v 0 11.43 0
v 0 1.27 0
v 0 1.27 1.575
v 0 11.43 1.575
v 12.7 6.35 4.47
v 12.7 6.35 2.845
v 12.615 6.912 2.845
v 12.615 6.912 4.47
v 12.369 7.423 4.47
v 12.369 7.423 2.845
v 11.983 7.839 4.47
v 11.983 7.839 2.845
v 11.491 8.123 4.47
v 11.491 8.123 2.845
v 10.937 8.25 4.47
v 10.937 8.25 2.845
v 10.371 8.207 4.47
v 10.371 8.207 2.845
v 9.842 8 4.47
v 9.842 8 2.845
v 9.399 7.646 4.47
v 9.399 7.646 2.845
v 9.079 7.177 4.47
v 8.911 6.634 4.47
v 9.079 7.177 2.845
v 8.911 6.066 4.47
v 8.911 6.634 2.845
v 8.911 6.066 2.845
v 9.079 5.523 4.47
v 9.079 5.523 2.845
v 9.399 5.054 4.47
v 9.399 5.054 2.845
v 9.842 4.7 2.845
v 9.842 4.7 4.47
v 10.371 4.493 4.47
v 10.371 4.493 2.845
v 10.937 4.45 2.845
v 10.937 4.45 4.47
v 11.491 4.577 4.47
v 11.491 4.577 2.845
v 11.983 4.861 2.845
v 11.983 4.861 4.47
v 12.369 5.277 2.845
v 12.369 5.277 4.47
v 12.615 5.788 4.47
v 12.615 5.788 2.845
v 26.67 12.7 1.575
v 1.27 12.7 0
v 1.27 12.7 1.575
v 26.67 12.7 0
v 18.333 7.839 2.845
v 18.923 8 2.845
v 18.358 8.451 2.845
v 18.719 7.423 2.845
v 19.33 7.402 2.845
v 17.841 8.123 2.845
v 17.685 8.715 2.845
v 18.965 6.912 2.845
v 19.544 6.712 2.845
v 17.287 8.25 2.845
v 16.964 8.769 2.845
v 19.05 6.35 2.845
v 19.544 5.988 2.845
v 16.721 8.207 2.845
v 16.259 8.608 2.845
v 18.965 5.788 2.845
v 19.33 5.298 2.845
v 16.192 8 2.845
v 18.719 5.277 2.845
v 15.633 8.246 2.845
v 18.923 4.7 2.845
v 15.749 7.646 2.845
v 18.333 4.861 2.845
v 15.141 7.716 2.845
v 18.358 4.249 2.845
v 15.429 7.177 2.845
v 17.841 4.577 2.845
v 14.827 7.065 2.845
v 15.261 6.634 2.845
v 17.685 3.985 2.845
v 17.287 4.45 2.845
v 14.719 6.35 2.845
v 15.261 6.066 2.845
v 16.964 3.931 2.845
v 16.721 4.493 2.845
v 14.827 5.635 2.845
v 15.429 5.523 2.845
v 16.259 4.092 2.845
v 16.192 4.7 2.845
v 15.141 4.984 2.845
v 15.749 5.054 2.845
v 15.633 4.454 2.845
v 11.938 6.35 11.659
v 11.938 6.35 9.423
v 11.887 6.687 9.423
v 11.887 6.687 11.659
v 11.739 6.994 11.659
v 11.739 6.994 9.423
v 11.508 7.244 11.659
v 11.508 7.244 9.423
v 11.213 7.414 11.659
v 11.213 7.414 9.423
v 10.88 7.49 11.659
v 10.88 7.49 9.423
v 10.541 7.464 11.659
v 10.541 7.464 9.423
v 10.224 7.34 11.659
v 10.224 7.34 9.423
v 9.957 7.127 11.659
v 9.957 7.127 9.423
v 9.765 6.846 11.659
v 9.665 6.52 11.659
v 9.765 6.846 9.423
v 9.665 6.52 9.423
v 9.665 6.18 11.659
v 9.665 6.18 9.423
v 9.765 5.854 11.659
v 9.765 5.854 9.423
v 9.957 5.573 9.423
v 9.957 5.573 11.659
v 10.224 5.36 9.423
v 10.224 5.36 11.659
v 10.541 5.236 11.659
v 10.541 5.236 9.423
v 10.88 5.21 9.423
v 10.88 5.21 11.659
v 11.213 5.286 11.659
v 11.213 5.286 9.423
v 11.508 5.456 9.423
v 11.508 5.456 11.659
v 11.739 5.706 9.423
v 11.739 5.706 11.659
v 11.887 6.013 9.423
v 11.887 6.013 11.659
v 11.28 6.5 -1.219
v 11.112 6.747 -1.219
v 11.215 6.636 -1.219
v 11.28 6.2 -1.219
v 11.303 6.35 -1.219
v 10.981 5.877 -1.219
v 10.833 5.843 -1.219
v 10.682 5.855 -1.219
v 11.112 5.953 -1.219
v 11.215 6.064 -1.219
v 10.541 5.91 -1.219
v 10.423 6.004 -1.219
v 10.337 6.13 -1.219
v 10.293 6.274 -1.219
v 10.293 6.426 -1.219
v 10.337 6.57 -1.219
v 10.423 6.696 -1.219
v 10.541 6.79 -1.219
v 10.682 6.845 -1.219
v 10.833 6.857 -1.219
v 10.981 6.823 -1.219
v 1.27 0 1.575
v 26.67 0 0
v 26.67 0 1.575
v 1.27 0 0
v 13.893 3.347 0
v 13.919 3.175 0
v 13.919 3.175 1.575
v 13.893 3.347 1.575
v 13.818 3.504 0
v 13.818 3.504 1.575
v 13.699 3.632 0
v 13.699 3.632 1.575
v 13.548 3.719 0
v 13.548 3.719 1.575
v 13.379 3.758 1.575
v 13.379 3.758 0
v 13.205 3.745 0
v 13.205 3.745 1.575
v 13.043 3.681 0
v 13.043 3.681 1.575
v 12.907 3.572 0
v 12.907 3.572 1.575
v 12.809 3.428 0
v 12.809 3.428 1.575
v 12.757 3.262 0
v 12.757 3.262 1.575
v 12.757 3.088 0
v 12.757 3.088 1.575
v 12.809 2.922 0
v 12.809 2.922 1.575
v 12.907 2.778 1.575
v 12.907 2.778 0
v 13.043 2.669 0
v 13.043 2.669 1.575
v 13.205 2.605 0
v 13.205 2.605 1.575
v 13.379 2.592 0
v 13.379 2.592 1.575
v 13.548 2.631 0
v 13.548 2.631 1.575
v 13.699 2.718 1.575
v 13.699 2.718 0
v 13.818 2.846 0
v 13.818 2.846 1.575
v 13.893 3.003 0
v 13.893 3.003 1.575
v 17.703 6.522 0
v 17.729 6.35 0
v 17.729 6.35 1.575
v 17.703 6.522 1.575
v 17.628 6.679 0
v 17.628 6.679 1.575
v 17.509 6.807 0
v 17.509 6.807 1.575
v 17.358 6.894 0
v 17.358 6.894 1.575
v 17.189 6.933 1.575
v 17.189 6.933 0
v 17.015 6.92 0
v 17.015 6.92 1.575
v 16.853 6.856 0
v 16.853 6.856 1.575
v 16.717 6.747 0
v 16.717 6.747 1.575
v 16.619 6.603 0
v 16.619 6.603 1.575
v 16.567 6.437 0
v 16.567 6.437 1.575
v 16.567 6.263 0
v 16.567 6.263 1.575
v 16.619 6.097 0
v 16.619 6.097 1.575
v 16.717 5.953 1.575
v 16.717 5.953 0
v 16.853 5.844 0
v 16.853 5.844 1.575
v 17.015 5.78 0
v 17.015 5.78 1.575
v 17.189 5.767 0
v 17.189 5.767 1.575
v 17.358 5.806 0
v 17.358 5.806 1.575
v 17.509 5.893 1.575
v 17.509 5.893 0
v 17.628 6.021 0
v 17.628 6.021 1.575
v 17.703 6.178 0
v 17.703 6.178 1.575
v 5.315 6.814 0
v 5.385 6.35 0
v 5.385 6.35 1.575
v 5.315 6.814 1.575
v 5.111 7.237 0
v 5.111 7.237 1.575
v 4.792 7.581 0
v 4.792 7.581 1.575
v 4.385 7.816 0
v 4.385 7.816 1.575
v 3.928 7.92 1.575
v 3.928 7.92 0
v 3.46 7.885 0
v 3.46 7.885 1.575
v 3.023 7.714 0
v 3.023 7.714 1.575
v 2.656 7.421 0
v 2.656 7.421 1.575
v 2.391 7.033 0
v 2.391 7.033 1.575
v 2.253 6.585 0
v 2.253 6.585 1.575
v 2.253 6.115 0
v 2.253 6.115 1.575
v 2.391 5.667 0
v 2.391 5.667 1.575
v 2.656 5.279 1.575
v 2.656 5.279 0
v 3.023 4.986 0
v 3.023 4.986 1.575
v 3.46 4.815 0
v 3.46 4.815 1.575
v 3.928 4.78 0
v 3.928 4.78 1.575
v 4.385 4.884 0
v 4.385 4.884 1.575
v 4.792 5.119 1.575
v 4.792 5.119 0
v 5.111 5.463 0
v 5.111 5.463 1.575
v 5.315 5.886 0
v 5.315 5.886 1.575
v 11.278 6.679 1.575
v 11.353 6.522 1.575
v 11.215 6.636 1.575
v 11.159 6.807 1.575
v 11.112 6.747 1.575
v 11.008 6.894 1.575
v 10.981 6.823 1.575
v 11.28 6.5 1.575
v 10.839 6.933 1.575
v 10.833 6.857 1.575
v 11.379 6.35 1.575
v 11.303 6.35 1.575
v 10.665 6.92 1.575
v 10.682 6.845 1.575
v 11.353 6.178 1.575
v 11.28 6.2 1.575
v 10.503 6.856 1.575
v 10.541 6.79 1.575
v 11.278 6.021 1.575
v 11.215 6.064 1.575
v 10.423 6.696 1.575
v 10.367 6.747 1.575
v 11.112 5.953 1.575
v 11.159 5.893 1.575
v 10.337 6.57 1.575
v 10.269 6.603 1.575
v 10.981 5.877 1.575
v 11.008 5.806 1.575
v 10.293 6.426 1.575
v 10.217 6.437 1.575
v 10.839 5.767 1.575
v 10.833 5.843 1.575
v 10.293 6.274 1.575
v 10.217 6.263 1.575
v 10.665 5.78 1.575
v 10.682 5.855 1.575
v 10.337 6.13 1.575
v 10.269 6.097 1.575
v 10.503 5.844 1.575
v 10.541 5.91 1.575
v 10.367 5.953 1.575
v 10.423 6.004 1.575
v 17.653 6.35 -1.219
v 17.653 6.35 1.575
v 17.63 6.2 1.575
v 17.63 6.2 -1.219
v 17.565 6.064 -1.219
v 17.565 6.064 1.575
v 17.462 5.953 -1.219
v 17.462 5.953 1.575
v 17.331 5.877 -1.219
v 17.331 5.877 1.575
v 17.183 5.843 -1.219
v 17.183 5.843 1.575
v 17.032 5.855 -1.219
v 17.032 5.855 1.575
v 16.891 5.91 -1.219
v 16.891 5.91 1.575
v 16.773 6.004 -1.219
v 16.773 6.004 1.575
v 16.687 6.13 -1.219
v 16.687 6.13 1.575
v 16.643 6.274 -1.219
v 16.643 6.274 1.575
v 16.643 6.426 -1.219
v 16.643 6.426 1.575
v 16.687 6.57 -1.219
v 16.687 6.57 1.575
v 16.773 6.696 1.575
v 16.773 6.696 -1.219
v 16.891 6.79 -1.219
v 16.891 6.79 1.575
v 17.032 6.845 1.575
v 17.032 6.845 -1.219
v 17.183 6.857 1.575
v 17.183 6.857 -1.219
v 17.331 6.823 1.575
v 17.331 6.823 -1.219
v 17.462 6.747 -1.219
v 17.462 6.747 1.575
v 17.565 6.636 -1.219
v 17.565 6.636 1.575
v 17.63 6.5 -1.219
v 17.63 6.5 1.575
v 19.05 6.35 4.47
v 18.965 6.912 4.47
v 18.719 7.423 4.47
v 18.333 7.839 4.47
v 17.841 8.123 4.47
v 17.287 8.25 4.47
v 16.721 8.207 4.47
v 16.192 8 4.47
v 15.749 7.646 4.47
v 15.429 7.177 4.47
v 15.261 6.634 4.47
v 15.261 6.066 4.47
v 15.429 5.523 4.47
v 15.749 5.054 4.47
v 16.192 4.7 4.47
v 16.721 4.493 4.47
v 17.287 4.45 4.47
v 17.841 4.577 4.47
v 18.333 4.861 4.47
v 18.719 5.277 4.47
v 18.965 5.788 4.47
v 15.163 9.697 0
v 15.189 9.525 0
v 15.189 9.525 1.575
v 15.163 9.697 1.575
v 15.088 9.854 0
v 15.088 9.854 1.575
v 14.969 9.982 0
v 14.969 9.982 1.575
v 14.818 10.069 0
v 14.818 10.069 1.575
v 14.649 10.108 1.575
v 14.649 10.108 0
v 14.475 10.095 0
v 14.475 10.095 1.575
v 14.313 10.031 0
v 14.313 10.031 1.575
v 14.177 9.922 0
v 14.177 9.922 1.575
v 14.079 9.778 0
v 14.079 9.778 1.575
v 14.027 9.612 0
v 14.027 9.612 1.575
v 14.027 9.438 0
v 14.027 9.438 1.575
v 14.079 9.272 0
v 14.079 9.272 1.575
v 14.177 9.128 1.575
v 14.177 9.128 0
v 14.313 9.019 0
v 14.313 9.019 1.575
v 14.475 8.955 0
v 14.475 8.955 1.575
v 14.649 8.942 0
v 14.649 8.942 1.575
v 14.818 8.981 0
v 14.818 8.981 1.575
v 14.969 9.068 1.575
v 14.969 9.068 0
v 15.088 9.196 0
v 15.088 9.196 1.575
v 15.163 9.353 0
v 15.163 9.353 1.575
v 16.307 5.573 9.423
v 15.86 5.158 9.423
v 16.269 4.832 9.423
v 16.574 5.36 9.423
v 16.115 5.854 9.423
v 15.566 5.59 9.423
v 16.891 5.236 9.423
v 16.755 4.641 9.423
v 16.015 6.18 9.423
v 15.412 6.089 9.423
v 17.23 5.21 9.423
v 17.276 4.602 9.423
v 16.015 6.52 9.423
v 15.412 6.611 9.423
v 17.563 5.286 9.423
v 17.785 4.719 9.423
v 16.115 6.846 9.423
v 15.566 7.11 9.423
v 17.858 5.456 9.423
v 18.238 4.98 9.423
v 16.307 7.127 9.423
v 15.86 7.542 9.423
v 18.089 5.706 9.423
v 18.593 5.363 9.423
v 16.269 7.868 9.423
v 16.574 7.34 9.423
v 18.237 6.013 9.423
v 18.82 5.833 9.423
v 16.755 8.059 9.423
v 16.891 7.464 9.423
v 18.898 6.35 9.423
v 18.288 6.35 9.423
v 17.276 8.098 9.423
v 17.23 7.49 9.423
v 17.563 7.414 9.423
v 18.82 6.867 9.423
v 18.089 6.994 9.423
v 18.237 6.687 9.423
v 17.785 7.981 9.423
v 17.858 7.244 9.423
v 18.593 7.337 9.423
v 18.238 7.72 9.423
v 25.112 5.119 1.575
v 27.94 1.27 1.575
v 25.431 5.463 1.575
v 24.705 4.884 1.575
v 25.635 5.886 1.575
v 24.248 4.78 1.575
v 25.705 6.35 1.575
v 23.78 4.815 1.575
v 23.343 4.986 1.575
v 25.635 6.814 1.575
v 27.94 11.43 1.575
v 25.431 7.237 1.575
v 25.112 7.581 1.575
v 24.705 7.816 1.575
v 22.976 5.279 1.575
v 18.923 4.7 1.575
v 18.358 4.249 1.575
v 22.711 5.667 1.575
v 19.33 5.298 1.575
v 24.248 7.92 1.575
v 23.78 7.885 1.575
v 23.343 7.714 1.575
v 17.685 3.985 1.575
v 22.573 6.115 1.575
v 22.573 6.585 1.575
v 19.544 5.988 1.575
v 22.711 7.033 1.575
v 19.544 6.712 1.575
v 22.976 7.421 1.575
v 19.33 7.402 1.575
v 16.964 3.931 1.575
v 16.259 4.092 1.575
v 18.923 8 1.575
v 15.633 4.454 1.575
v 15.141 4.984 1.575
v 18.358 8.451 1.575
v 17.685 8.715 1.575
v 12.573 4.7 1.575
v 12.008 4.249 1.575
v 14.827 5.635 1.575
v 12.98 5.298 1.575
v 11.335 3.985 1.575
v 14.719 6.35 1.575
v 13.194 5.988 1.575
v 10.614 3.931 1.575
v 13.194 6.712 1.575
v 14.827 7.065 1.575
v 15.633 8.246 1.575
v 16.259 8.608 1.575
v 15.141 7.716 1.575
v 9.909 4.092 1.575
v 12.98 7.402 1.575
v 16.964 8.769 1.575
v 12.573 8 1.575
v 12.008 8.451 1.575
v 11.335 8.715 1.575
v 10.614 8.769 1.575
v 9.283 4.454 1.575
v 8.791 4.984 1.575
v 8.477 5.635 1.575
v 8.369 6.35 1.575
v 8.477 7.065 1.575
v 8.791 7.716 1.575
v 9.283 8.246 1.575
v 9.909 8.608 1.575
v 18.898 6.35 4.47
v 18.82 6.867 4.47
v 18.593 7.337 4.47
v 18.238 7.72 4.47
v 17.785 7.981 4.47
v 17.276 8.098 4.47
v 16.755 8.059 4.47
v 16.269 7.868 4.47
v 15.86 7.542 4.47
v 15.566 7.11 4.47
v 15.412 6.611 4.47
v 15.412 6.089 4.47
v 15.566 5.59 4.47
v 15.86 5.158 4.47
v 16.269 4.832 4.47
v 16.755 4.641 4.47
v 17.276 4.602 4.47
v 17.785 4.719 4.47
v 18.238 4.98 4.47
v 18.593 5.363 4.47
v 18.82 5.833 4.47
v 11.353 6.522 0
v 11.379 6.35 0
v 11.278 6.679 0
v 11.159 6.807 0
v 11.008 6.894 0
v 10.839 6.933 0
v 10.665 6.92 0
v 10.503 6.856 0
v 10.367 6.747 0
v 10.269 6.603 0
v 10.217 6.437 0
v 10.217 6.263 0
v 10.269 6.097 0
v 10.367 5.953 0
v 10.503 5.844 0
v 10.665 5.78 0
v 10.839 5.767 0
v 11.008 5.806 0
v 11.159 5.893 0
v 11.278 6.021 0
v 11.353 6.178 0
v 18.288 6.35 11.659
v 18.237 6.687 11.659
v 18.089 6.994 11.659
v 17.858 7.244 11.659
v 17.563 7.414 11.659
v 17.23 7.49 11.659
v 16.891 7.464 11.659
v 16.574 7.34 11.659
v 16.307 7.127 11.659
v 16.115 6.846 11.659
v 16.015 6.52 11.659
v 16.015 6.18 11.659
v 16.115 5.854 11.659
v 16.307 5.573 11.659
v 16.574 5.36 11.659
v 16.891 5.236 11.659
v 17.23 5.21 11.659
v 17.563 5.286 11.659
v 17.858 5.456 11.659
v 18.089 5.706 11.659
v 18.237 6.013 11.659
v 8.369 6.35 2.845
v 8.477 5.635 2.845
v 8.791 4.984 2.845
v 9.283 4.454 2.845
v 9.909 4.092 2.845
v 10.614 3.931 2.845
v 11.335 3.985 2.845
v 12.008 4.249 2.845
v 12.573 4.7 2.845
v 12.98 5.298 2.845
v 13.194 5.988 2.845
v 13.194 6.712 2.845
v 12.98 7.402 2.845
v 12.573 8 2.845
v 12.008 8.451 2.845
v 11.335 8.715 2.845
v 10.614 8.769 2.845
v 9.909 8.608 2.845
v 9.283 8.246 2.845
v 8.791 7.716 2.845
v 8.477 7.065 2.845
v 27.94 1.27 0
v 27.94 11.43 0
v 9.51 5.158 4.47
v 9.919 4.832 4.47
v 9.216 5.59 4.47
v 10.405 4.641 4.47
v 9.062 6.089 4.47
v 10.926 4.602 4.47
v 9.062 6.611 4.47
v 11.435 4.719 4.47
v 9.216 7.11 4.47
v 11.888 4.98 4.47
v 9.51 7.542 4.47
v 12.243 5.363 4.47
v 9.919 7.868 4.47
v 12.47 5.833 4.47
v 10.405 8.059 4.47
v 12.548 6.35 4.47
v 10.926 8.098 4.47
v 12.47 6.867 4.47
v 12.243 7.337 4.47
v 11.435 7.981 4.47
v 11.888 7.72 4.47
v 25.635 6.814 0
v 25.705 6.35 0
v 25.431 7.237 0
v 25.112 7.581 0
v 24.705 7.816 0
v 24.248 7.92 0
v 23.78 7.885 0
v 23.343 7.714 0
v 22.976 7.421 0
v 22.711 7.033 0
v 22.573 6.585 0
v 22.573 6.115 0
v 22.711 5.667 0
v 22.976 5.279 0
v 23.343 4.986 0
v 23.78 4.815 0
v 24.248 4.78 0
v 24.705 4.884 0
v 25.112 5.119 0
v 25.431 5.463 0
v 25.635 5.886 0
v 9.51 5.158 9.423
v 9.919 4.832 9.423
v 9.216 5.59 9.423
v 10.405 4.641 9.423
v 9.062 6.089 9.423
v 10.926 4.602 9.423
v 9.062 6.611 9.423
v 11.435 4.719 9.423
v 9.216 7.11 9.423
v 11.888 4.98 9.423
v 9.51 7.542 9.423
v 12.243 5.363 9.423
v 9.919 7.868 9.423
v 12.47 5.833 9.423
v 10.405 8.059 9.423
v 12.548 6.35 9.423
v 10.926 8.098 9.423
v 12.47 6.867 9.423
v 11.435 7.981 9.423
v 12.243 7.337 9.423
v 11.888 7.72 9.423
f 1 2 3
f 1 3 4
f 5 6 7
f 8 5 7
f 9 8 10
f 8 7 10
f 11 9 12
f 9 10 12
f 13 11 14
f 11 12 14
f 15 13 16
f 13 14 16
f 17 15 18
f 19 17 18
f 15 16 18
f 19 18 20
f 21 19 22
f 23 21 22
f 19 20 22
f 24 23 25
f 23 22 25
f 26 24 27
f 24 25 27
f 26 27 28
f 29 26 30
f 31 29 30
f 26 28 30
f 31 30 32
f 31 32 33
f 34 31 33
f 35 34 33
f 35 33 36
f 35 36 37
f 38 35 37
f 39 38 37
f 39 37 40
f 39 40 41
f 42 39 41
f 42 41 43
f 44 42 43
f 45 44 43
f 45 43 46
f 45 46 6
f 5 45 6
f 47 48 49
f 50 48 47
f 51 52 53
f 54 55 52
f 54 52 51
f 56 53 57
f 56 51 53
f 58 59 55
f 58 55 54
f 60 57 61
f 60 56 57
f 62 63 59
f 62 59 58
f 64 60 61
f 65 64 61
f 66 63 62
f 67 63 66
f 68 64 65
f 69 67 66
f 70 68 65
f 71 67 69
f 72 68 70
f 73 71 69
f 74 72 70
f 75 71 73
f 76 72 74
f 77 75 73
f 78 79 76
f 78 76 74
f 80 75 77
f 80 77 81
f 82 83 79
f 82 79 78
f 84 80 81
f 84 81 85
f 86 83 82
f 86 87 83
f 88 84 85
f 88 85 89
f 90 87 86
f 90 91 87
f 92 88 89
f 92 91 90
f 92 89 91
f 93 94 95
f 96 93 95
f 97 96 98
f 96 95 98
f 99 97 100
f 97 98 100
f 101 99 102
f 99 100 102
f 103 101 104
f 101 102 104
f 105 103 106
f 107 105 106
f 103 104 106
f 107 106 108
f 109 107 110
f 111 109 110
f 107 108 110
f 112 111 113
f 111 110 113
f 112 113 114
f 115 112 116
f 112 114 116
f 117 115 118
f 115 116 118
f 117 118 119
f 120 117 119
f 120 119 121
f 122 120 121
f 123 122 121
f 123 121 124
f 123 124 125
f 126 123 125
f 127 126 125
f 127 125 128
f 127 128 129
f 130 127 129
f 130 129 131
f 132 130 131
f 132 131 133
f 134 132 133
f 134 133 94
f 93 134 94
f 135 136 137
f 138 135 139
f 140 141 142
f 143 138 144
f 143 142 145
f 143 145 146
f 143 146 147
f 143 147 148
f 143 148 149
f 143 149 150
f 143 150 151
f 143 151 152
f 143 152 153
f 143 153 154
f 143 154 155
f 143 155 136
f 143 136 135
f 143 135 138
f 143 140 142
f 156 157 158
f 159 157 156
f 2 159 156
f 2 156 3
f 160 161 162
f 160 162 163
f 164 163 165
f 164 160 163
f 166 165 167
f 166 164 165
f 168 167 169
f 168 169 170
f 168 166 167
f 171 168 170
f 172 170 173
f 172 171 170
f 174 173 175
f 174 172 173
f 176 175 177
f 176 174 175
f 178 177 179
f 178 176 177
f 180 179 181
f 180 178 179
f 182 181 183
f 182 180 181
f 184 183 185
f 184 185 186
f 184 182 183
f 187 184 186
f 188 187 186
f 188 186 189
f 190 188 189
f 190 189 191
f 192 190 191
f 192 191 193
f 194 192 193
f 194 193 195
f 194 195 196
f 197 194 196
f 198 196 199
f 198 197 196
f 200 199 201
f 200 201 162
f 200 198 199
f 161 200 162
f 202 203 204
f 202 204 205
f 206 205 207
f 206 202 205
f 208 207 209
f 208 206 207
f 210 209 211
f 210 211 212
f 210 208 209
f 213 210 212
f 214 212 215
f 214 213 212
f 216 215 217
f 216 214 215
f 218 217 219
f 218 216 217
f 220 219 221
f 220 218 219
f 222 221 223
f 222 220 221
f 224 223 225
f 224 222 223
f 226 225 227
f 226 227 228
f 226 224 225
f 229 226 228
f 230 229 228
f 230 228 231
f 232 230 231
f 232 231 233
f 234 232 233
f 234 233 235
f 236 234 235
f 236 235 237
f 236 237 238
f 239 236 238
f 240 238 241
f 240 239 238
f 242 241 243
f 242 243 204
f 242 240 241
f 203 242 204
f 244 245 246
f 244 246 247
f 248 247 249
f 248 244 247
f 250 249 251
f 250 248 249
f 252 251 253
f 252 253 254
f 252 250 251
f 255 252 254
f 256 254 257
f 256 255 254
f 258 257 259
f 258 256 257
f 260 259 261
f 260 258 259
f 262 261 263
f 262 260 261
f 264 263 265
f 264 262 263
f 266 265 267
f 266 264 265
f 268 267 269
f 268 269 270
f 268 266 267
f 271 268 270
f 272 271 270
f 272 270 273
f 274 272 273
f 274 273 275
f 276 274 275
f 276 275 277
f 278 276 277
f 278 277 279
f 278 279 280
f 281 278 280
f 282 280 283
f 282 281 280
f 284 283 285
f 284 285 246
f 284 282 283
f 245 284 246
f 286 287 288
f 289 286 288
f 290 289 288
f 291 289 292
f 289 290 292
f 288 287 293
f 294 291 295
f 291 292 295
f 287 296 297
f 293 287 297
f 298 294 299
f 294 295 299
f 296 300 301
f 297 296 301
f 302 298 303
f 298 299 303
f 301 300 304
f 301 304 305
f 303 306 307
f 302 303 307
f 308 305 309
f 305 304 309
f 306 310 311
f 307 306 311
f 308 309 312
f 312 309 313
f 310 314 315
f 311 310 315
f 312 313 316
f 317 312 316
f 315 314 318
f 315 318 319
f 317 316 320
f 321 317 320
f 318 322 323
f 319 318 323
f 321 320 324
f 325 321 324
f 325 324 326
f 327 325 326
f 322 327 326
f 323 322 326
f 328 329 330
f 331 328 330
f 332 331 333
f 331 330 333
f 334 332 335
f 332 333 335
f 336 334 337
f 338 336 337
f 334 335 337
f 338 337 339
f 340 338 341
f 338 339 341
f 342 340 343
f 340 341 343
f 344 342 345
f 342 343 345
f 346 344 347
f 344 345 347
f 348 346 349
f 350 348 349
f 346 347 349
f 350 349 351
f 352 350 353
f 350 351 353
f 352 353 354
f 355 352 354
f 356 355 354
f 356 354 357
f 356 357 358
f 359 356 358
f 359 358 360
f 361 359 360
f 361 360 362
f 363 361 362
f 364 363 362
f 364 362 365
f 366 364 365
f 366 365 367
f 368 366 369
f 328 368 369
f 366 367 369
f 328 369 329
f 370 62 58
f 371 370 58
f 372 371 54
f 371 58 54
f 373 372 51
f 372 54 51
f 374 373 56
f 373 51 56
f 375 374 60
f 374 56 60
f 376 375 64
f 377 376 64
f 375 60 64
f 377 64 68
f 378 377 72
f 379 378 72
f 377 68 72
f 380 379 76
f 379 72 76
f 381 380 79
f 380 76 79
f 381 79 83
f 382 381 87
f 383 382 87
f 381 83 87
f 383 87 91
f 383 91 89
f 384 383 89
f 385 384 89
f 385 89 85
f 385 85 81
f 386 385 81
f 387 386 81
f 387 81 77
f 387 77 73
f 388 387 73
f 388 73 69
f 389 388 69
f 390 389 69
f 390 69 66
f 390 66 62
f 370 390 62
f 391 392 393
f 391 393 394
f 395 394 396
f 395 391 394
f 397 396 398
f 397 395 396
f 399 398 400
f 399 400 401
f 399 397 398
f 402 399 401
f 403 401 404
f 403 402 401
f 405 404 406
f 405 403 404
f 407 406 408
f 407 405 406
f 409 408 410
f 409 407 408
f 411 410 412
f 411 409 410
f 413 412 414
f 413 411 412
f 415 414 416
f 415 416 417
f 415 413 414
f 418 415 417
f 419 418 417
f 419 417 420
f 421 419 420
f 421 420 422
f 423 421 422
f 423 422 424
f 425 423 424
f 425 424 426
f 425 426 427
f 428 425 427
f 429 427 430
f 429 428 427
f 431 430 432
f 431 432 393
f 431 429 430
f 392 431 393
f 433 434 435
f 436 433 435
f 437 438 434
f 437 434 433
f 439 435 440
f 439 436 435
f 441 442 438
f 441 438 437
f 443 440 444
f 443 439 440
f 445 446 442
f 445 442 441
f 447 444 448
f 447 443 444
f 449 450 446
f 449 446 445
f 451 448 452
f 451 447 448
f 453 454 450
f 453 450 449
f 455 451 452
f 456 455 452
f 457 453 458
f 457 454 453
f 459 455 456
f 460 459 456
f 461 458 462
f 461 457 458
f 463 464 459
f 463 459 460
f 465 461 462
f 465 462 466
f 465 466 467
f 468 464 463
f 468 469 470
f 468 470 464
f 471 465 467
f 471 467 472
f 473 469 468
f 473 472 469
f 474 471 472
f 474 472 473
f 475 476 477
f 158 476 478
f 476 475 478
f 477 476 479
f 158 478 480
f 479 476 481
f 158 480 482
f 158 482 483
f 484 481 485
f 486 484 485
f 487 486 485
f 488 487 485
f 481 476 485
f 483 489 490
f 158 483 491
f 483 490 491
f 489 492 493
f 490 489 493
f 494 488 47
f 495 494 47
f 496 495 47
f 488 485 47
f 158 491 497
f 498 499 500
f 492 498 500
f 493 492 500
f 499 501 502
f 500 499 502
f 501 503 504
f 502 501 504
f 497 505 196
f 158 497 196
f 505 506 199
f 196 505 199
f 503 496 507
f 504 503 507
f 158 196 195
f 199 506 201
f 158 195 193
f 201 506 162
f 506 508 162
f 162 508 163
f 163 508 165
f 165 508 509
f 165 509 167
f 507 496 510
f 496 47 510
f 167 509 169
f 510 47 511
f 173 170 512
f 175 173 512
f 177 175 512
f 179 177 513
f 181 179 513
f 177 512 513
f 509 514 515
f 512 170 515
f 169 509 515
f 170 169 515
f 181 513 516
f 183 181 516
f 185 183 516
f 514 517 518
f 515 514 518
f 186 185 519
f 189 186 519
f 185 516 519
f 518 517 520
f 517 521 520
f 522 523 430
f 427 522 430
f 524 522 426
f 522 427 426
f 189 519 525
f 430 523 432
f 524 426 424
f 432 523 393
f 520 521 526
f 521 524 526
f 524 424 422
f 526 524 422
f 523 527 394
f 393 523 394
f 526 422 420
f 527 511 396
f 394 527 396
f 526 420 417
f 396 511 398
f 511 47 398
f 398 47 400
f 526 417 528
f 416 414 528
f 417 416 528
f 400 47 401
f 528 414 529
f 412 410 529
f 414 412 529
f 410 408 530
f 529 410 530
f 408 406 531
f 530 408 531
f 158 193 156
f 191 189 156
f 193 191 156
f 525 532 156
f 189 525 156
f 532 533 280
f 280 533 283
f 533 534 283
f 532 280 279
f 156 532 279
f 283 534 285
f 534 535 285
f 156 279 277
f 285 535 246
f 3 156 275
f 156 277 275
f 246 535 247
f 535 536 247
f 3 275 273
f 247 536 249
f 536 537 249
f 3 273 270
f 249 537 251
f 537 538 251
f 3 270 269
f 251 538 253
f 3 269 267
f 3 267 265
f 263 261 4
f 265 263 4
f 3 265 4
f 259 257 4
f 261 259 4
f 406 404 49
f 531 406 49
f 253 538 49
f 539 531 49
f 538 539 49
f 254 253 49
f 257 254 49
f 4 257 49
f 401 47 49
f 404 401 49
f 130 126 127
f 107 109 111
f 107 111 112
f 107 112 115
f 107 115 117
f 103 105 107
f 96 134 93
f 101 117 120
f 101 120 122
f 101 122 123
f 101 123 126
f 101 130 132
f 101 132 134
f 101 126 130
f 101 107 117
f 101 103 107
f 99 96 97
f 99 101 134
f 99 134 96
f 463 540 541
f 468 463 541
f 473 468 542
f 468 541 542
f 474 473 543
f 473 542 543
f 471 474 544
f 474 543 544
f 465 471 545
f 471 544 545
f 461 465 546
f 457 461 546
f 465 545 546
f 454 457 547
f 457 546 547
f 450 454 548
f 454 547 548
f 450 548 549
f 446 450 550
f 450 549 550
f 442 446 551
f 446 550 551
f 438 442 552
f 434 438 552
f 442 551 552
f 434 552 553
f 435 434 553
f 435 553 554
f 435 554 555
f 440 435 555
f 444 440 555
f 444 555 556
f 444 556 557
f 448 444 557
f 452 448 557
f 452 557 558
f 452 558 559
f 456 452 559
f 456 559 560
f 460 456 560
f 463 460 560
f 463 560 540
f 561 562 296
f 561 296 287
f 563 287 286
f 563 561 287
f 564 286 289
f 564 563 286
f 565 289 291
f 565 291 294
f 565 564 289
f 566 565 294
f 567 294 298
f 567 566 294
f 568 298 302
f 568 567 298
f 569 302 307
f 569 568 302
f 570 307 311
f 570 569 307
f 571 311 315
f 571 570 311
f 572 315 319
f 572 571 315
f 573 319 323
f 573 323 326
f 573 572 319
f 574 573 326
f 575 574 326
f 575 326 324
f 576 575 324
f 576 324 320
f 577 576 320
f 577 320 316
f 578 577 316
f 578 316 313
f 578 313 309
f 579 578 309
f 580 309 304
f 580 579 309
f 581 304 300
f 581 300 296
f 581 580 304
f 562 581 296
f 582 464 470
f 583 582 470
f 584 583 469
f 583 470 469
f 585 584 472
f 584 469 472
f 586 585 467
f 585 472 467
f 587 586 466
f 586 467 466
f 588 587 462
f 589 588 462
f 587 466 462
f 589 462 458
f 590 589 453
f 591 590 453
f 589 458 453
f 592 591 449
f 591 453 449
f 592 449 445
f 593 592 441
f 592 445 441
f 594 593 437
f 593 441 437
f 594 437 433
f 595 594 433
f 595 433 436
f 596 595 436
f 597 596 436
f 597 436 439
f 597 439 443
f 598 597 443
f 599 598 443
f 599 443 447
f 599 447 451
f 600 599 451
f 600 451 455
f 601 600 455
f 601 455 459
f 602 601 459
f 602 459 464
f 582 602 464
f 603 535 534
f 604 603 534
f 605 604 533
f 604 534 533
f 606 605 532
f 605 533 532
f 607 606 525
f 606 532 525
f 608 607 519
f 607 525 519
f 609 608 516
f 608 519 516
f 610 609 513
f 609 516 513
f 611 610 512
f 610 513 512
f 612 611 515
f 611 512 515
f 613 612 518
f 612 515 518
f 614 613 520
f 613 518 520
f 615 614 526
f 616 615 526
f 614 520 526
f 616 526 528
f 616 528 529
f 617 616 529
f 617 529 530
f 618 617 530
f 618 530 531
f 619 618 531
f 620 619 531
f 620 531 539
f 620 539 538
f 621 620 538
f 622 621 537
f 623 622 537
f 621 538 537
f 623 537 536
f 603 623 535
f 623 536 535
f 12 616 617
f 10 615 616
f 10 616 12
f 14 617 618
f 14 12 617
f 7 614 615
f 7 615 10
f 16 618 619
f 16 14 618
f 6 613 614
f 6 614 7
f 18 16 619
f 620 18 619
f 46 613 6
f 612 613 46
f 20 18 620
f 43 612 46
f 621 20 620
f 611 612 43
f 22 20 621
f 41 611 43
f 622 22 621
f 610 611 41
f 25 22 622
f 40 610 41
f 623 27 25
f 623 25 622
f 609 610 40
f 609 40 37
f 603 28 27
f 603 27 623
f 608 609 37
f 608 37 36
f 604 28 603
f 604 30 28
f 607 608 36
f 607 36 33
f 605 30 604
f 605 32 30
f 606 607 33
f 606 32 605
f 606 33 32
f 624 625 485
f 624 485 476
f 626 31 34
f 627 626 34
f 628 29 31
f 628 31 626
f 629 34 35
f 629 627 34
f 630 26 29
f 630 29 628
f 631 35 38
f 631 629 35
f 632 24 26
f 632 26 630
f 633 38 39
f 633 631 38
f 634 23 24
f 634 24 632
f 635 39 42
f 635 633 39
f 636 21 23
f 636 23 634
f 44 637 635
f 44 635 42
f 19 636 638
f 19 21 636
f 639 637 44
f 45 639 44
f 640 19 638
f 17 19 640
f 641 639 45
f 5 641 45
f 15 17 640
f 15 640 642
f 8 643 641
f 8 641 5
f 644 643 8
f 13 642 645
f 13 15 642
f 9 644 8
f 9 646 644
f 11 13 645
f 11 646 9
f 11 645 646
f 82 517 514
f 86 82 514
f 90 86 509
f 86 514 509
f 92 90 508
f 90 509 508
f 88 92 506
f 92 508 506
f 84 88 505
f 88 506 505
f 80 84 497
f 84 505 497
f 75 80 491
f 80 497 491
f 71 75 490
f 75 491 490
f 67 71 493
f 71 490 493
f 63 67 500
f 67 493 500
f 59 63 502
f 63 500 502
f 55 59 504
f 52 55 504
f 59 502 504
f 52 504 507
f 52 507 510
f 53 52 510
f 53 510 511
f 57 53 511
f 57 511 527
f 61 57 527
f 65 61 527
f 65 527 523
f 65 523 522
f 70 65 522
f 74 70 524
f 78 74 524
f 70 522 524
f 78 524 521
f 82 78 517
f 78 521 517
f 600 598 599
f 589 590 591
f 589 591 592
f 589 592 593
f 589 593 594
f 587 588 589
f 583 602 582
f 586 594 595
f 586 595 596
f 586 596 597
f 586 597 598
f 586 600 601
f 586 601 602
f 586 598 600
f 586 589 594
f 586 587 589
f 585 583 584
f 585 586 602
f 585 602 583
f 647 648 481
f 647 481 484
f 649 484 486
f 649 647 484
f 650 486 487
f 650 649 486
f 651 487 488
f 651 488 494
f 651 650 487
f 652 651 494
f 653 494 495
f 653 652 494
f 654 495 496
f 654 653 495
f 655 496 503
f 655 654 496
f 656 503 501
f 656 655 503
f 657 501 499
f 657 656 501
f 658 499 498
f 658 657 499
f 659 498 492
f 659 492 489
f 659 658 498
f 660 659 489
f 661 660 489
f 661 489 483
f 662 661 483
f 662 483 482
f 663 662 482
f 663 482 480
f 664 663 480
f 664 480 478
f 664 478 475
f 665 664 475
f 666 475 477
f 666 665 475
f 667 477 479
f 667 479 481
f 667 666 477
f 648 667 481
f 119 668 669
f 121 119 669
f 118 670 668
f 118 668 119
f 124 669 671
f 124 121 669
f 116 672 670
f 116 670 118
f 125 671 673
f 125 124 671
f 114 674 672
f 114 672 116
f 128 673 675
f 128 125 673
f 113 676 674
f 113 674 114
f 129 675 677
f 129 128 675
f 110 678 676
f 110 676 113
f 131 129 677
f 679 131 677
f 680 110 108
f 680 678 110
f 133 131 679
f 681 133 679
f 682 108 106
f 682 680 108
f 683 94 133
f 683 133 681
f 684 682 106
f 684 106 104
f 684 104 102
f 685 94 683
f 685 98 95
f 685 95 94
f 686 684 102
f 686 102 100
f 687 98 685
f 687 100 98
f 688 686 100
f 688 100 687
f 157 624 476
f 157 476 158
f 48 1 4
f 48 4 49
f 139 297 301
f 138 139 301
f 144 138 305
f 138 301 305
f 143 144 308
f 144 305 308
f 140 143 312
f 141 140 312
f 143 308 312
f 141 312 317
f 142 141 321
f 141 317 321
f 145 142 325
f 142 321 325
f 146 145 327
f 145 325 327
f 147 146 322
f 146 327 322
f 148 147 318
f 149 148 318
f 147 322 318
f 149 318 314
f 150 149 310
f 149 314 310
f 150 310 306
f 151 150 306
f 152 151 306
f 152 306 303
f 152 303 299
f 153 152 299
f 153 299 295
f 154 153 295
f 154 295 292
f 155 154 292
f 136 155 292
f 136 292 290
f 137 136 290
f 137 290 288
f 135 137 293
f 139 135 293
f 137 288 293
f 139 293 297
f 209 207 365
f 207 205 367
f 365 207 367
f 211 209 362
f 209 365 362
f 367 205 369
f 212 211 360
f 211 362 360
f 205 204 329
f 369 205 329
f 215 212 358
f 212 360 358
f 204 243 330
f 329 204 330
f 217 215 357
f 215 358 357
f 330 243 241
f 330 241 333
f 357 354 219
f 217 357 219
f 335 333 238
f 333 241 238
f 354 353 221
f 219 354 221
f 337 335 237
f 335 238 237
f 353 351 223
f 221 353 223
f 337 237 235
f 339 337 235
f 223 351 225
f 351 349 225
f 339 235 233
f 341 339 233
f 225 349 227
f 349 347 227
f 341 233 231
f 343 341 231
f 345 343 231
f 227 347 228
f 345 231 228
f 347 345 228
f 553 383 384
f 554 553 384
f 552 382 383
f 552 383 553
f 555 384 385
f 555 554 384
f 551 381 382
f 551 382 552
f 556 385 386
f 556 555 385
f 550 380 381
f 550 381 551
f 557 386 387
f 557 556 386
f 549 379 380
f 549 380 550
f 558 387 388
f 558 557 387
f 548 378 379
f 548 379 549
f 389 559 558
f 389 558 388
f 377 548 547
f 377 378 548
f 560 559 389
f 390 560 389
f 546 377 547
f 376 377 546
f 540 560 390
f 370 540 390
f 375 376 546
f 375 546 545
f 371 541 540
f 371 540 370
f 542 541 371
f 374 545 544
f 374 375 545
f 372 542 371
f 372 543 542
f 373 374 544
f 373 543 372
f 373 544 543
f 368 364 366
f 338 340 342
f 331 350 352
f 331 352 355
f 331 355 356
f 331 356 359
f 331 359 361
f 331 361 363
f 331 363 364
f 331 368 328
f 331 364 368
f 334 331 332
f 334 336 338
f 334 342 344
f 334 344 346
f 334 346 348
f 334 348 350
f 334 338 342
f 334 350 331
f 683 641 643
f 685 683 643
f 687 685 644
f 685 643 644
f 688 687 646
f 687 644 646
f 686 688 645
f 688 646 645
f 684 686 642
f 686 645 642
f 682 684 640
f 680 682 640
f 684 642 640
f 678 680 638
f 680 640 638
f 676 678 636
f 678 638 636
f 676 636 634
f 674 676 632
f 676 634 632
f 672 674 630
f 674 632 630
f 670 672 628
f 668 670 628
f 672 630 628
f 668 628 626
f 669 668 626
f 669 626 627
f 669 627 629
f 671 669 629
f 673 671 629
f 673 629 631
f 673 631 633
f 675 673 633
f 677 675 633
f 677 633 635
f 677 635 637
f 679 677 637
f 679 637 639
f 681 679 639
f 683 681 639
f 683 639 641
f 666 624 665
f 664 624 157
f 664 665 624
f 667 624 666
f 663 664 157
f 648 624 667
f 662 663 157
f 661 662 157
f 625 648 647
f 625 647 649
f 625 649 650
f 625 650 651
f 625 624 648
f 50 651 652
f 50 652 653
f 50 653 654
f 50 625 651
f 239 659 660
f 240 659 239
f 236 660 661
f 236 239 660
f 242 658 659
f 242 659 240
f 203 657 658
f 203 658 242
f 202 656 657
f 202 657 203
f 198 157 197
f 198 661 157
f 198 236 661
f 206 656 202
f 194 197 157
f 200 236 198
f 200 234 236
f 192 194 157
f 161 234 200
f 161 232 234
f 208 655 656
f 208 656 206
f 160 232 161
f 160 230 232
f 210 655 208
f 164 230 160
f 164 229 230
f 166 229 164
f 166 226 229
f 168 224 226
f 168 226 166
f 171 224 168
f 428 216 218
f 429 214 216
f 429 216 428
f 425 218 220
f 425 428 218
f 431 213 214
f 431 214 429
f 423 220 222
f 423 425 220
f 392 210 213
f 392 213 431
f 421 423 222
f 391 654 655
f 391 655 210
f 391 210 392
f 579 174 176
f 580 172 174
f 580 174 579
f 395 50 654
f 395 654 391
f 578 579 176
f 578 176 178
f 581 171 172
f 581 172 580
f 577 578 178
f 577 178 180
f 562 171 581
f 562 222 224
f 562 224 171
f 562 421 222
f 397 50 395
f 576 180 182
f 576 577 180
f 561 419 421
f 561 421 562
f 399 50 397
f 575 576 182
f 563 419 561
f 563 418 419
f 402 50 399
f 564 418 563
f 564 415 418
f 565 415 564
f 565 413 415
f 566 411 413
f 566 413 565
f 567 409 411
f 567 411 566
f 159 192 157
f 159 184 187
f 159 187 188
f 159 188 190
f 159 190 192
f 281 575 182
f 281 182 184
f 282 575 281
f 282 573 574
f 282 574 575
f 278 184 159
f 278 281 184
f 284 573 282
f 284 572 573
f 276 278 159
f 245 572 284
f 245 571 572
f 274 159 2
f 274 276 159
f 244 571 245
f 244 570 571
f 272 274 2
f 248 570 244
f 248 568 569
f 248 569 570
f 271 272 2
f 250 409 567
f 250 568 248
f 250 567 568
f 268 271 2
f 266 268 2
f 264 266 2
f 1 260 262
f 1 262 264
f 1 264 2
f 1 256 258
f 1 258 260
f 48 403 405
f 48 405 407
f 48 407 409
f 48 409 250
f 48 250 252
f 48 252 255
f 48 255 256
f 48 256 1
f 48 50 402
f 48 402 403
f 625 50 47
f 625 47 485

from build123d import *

# Parameters (mm, degrees)
MODEL_R             = 0.5842
MODEL_R_2           = 1.5748
BOSS_EXTRUDE1_DEPTH = 1.5748
SKETCH1_R           = 2.4257
BOSS_EXTRUDE2_DEPTH = 1.27
SKETCH2_R           = 1.905
BOSS_EXTRUDE3_DEPTH = 2.8956
SKETCH3_R           = 1.7526
BOSS_EXTRUDE4_DEPTH = 7.8486
SKETCH4_R           = 1.143
BOSS_EXTRUDE5_DEPTH = 10.0838
SKETCH5_R           = 0.508
BOSS_EXTRUDE6_DEPTH = 2.794


with BuildPart() as part:
    # Model → Boss-Extrude1 (new body)
    with BuildSketch(Plane.XY):
        Polygon((0, 11.43), (1.27, 12.7), (26.67, 12.7), (27.94, 11.43), (27.94, 1.27), (26.67, 0), (1.27, 0), (0, 1.27), align=None)
        with Locations((10.795, 6.35)):
            Circle(MODEL_R, mode=Mode.SUBTRACT)
        with Locations((17.145, 6.35)):
            Circle(MODEL_R, mode=Mode.SUBTRACT)
        with Locations((3.81, 6.35)):
            Circle(MODEL_R_2, mode=Mode.SUBTRACT)
        with Locations((24.13, 6.35)):
            Circle(MODEL_R_2, mode=Mode.SUBTRACT)
        with Locations((13.335, 3.175)):
            Circle(MODEL_R, mode=Mode.SUBTRACT)
        with Locations((14.605, 9.525)):
            Circle(MODEL_R, mode=Mode.SUBTRACT)
    extrude(amount=BOSS_EXTRUDE1_DEPTH)

    # Sketch1 → Boss-Extrude2 (add)
    with BuildSketch(Plane.XY.offset(1.5748)):
        with Locations(Location((10.795, 6.35, 0), (0, 0, 180))):
            Circle(SKETCH1_R)
        with Locations(Location((17.145, 6.35, 0), (0, 0, 180))):
            Circle(SKETCH1_R)
    extrude(amount=BOSS_EXTRUDE2_DEPTH)

    # Sketch2 → Boss-Extrude3 (add)
    with BuildSketch(Plane.XY.offset(1.5748)):
        with Locations((10.795, 6.35)):
            Circle(SKETCH2_R)
        with Locations((17.145, 6.35)):
            Circle(SKETCH2_R)
    extrude(amount=BOSS_EXTRUDE3_DEPTH)

    # Sketch3 → Boss-Extrude4 (add)
    with BuildSketch(Plane.XY.offset(1.5748)):
        with Locations((17.145, 6.35)):
            Circle(SKETCH3_R)
        with Locations((10.795, 6.35)):
            Circle(SKETCH3_R)
    extrude(amount=BOSS_EXTRUDE4_DEPTH)

    # Sketch4 → Boss-Extrude5 (add)
    with BuildSketch(Plane.XY.offset(1.5748)):
        with Locations((17.145, 6.35)):
            Circle(SKETCH4_R)
        with Locations((10.795, 6.35)):
            Circle(SKETCH4_R)
    extrude(amount=BOSS_EXTRUDE5_DEPTH)

    # Sketch5 → Boss-Extrude6 (add)
    with BuildSketch(Plane(origin=(0, 0, 1.5748), x_dir=(-1, 0, 0), z_dir=(0, 0, -1))):
        with Locations(Location((-17.145, 6.35, 0), (0, 0, 180))):
            Circle(SKETCH5_R)
        with Locations(Location((-10.795, 6.35, 0), (0, 0, 180))):
            Circle(SKETCH5_R)
    extrude(amount=BOSS_EXTRUDE6_DEPTH)


solid = part.part
